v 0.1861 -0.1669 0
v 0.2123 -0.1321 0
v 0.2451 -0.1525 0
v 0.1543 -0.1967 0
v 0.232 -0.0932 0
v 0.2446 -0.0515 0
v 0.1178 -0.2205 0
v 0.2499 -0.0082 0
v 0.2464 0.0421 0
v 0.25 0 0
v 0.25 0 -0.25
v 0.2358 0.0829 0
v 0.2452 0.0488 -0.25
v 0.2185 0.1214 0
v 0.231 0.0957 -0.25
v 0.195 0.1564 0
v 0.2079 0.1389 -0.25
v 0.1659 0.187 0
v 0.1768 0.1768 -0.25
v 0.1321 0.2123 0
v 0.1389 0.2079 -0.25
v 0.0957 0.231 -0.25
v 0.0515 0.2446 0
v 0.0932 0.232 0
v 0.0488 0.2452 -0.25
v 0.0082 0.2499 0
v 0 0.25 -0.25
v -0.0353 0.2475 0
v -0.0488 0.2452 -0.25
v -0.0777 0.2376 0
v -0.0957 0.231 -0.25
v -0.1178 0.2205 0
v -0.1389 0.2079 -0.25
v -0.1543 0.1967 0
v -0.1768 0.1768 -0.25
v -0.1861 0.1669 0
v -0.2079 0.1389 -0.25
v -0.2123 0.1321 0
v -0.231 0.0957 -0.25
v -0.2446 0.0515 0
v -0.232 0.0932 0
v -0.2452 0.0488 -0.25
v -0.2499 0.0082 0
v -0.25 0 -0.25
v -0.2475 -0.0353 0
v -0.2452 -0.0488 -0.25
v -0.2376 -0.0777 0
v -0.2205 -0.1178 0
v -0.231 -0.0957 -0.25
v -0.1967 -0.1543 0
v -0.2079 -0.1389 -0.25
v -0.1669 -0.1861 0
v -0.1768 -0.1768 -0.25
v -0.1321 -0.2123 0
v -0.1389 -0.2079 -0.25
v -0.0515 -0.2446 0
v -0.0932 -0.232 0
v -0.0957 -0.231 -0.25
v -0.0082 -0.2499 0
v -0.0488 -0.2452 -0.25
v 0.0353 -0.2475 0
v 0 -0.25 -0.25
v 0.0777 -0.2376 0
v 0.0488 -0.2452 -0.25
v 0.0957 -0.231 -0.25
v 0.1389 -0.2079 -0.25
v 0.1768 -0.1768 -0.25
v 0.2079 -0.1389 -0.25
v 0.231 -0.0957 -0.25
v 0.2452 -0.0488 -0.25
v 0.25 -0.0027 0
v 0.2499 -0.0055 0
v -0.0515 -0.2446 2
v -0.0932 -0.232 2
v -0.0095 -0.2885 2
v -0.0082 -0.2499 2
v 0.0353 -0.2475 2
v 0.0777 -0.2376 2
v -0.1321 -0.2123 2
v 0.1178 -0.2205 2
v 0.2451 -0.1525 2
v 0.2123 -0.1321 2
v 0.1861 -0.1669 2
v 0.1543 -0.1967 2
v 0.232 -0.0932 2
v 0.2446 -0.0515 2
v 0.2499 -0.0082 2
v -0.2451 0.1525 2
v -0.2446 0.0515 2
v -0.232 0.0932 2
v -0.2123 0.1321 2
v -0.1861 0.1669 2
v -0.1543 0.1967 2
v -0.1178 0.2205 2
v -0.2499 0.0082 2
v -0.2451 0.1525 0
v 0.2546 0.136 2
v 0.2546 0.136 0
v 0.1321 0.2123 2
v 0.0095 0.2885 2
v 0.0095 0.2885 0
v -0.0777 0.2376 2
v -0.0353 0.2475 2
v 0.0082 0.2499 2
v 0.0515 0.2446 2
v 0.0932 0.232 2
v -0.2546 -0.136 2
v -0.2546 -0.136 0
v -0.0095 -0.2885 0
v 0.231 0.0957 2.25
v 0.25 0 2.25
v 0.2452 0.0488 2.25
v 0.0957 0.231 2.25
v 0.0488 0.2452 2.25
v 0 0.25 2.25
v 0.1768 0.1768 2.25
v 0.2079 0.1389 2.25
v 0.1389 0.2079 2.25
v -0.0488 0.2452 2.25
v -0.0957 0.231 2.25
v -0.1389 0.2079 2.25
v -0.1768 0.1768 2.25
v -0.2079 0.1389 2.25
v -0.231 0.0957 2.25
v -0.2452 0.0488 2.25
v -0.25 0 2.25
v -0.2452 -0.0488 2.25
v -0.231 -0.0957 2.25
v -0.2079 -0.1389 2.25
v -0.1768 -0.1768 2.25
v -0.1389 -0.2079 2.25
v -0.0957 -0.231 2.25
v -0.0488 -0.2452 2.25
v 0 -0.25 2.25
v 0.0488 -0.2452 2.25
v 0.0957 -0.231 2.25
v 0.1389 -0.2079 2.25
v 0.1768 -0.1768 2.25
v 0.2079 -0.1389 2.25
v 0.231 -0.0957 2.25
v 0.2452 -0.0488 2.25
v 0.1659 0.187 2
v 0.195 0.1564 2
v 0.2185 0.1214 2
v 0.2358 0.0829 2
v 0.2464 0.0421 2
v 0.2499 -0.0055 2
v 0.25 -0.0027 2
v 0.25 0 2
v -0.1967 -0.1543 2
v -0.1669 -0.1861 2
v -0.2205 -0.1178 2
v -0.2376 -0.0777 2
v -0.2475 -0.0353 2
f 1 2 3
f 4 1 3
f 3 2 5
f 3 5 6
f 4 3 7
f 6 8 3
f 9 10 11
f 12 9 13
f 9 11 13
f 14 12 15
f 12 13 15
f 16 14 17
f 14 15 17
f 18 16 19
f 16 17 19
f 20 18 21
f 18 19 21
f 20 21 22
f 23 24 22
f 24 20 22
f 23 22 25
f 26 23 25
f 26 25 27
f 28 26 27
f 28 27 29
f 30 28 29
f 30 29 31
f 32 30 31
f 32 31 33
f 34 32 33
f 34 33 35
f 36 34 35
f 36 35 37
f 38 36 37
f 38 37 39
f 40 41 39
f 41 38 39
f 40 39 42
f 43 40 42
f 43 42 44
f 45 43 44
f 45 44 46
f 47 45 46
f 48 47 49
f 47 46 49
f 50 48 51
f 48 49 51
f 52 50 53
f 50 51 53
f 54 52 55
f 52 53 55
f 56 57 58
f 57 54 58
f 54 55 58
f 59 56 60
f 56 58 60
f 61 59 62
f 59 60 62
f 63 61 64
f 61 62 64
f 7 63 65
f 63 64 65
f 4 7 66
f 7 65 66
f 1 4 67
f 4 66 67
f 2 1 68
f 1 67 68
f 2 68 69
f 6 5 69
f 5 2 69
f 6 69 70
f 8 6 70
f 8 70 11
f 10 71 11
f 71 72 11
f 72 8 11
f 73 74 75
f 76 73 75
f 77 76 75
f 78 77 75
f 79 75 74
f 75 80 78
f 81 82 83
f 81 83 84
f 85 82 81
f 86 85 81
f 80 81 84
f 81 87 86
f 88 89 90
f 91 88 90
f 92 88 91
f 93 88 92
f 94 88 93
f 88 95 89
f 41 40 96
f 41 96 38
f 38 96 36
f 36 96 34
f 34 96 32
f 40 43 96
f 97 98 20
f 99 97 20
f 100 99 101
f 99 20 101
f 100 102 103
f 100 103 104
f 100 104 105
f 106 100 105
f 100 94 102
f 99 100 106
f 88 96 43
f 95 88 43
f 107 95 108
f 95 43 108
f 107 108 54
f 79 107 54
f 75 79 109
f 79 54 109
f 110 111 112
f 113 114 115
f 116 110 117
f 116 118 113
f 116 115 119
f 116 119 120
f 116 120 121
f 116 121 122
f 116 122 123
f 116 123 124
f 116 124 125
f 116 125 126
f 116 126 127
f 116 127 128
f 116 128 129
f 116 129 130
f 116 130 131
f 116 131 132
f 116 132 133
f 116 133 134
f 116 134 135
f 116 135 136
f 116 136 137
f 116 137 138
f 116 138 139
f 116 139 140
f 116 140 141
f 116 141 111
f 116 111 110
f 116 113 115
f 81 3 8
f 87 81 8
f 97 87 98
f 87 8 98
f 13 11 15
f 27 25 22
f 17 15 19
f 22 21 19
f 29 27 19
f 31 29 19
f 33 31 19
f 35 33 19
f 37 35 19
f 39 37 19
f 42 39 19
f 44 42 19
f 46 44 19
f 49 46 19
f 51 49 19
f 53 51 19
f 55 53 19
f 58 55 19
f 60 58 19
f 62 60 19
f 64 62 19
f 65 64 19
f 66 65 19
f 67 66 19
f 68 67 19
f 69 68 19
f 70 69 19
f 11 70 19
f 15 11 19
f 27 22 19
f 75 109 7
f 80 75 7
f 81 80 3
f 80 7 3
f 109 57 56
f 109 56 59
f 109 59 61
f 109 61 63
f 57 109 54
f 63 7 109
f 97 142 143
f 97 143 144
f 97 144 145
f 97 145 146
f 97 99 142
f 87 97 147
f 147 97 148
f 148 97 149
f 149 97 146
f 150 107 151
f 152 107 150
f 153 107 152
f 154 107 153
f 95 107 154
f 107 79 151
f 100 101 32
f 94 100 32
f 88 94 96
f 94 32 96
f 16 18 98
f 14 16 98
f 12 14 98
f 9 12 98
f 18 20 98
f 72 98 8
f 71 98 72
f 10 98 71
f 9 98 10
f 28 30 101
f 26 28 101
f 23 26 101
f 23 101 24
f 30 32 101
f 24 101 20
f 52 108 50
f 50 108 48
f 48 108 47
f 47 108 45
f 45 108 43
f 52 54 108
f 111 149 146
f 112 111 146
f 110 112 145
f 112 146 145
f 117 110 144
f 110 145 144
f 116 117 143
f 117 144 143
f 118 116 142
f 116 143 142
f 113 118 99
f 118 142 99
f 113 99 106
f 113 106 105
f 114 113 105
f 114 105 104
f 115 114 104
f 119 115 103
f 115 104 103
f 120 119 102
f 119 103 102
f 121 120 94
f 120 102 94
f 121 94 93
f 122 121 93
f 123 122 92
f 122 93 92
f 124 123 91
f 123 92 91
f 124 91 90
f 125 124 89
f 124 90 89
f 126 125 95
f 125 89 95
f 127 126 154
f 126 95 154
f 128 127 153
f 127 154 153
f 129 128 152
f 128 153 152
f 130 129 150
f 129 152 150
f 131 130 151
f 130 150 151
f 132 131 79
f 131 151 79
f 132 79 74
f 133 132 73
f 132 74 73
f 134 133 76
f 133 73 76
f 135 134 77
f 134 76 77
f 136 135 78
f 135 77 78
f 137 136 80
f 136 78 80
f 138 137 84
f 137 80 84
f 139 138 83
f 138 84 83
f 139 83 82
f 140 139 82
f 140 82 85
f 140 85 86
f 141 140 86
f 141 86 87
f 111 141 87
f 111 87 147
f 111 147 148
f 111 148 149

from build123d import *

# Parameters (mm, degrees)
BOSS_EXTRUDE1_DEPTH      = 2
BOSS_EXTRUDE2_DEPTH      = 0.25
BOSS_EXTRUDE2_DEPTH_BACK = 2.25
SKETCH2_R                = 0.25


with BuildPart() as part:
    # Sketch1 → Boss-Extrude1 (new body)
    with BuildSketch(Plane.XY):
        Polygon((-0.24510172, 0.152507312), (-0.254626066, -0.13601066), (-0.009524346, -0.288517972), (0.24510172, -0.152507312), (0.254626066, 0.13601066), (0.009524346, 0.288517972), align=None)
    extrude(amount=BOSS_EXTRUDE1_DEPTH)

    # Sketch2 → Boss-Extrude2 (add, two sides: drawn at the far end of the back side and taken through both)
    with BuildSketch(Plane.XY.offset(2).offset(-BOSS_EXTRUDE2_DEPTH_BACK)):
        Circle(SKETCH2_R)
    extrude(amount=BOSS_EXTRUDE2_DEPTH + BOSS_EXTRUDE2_DEPTH_BACK)


solid = part.part
